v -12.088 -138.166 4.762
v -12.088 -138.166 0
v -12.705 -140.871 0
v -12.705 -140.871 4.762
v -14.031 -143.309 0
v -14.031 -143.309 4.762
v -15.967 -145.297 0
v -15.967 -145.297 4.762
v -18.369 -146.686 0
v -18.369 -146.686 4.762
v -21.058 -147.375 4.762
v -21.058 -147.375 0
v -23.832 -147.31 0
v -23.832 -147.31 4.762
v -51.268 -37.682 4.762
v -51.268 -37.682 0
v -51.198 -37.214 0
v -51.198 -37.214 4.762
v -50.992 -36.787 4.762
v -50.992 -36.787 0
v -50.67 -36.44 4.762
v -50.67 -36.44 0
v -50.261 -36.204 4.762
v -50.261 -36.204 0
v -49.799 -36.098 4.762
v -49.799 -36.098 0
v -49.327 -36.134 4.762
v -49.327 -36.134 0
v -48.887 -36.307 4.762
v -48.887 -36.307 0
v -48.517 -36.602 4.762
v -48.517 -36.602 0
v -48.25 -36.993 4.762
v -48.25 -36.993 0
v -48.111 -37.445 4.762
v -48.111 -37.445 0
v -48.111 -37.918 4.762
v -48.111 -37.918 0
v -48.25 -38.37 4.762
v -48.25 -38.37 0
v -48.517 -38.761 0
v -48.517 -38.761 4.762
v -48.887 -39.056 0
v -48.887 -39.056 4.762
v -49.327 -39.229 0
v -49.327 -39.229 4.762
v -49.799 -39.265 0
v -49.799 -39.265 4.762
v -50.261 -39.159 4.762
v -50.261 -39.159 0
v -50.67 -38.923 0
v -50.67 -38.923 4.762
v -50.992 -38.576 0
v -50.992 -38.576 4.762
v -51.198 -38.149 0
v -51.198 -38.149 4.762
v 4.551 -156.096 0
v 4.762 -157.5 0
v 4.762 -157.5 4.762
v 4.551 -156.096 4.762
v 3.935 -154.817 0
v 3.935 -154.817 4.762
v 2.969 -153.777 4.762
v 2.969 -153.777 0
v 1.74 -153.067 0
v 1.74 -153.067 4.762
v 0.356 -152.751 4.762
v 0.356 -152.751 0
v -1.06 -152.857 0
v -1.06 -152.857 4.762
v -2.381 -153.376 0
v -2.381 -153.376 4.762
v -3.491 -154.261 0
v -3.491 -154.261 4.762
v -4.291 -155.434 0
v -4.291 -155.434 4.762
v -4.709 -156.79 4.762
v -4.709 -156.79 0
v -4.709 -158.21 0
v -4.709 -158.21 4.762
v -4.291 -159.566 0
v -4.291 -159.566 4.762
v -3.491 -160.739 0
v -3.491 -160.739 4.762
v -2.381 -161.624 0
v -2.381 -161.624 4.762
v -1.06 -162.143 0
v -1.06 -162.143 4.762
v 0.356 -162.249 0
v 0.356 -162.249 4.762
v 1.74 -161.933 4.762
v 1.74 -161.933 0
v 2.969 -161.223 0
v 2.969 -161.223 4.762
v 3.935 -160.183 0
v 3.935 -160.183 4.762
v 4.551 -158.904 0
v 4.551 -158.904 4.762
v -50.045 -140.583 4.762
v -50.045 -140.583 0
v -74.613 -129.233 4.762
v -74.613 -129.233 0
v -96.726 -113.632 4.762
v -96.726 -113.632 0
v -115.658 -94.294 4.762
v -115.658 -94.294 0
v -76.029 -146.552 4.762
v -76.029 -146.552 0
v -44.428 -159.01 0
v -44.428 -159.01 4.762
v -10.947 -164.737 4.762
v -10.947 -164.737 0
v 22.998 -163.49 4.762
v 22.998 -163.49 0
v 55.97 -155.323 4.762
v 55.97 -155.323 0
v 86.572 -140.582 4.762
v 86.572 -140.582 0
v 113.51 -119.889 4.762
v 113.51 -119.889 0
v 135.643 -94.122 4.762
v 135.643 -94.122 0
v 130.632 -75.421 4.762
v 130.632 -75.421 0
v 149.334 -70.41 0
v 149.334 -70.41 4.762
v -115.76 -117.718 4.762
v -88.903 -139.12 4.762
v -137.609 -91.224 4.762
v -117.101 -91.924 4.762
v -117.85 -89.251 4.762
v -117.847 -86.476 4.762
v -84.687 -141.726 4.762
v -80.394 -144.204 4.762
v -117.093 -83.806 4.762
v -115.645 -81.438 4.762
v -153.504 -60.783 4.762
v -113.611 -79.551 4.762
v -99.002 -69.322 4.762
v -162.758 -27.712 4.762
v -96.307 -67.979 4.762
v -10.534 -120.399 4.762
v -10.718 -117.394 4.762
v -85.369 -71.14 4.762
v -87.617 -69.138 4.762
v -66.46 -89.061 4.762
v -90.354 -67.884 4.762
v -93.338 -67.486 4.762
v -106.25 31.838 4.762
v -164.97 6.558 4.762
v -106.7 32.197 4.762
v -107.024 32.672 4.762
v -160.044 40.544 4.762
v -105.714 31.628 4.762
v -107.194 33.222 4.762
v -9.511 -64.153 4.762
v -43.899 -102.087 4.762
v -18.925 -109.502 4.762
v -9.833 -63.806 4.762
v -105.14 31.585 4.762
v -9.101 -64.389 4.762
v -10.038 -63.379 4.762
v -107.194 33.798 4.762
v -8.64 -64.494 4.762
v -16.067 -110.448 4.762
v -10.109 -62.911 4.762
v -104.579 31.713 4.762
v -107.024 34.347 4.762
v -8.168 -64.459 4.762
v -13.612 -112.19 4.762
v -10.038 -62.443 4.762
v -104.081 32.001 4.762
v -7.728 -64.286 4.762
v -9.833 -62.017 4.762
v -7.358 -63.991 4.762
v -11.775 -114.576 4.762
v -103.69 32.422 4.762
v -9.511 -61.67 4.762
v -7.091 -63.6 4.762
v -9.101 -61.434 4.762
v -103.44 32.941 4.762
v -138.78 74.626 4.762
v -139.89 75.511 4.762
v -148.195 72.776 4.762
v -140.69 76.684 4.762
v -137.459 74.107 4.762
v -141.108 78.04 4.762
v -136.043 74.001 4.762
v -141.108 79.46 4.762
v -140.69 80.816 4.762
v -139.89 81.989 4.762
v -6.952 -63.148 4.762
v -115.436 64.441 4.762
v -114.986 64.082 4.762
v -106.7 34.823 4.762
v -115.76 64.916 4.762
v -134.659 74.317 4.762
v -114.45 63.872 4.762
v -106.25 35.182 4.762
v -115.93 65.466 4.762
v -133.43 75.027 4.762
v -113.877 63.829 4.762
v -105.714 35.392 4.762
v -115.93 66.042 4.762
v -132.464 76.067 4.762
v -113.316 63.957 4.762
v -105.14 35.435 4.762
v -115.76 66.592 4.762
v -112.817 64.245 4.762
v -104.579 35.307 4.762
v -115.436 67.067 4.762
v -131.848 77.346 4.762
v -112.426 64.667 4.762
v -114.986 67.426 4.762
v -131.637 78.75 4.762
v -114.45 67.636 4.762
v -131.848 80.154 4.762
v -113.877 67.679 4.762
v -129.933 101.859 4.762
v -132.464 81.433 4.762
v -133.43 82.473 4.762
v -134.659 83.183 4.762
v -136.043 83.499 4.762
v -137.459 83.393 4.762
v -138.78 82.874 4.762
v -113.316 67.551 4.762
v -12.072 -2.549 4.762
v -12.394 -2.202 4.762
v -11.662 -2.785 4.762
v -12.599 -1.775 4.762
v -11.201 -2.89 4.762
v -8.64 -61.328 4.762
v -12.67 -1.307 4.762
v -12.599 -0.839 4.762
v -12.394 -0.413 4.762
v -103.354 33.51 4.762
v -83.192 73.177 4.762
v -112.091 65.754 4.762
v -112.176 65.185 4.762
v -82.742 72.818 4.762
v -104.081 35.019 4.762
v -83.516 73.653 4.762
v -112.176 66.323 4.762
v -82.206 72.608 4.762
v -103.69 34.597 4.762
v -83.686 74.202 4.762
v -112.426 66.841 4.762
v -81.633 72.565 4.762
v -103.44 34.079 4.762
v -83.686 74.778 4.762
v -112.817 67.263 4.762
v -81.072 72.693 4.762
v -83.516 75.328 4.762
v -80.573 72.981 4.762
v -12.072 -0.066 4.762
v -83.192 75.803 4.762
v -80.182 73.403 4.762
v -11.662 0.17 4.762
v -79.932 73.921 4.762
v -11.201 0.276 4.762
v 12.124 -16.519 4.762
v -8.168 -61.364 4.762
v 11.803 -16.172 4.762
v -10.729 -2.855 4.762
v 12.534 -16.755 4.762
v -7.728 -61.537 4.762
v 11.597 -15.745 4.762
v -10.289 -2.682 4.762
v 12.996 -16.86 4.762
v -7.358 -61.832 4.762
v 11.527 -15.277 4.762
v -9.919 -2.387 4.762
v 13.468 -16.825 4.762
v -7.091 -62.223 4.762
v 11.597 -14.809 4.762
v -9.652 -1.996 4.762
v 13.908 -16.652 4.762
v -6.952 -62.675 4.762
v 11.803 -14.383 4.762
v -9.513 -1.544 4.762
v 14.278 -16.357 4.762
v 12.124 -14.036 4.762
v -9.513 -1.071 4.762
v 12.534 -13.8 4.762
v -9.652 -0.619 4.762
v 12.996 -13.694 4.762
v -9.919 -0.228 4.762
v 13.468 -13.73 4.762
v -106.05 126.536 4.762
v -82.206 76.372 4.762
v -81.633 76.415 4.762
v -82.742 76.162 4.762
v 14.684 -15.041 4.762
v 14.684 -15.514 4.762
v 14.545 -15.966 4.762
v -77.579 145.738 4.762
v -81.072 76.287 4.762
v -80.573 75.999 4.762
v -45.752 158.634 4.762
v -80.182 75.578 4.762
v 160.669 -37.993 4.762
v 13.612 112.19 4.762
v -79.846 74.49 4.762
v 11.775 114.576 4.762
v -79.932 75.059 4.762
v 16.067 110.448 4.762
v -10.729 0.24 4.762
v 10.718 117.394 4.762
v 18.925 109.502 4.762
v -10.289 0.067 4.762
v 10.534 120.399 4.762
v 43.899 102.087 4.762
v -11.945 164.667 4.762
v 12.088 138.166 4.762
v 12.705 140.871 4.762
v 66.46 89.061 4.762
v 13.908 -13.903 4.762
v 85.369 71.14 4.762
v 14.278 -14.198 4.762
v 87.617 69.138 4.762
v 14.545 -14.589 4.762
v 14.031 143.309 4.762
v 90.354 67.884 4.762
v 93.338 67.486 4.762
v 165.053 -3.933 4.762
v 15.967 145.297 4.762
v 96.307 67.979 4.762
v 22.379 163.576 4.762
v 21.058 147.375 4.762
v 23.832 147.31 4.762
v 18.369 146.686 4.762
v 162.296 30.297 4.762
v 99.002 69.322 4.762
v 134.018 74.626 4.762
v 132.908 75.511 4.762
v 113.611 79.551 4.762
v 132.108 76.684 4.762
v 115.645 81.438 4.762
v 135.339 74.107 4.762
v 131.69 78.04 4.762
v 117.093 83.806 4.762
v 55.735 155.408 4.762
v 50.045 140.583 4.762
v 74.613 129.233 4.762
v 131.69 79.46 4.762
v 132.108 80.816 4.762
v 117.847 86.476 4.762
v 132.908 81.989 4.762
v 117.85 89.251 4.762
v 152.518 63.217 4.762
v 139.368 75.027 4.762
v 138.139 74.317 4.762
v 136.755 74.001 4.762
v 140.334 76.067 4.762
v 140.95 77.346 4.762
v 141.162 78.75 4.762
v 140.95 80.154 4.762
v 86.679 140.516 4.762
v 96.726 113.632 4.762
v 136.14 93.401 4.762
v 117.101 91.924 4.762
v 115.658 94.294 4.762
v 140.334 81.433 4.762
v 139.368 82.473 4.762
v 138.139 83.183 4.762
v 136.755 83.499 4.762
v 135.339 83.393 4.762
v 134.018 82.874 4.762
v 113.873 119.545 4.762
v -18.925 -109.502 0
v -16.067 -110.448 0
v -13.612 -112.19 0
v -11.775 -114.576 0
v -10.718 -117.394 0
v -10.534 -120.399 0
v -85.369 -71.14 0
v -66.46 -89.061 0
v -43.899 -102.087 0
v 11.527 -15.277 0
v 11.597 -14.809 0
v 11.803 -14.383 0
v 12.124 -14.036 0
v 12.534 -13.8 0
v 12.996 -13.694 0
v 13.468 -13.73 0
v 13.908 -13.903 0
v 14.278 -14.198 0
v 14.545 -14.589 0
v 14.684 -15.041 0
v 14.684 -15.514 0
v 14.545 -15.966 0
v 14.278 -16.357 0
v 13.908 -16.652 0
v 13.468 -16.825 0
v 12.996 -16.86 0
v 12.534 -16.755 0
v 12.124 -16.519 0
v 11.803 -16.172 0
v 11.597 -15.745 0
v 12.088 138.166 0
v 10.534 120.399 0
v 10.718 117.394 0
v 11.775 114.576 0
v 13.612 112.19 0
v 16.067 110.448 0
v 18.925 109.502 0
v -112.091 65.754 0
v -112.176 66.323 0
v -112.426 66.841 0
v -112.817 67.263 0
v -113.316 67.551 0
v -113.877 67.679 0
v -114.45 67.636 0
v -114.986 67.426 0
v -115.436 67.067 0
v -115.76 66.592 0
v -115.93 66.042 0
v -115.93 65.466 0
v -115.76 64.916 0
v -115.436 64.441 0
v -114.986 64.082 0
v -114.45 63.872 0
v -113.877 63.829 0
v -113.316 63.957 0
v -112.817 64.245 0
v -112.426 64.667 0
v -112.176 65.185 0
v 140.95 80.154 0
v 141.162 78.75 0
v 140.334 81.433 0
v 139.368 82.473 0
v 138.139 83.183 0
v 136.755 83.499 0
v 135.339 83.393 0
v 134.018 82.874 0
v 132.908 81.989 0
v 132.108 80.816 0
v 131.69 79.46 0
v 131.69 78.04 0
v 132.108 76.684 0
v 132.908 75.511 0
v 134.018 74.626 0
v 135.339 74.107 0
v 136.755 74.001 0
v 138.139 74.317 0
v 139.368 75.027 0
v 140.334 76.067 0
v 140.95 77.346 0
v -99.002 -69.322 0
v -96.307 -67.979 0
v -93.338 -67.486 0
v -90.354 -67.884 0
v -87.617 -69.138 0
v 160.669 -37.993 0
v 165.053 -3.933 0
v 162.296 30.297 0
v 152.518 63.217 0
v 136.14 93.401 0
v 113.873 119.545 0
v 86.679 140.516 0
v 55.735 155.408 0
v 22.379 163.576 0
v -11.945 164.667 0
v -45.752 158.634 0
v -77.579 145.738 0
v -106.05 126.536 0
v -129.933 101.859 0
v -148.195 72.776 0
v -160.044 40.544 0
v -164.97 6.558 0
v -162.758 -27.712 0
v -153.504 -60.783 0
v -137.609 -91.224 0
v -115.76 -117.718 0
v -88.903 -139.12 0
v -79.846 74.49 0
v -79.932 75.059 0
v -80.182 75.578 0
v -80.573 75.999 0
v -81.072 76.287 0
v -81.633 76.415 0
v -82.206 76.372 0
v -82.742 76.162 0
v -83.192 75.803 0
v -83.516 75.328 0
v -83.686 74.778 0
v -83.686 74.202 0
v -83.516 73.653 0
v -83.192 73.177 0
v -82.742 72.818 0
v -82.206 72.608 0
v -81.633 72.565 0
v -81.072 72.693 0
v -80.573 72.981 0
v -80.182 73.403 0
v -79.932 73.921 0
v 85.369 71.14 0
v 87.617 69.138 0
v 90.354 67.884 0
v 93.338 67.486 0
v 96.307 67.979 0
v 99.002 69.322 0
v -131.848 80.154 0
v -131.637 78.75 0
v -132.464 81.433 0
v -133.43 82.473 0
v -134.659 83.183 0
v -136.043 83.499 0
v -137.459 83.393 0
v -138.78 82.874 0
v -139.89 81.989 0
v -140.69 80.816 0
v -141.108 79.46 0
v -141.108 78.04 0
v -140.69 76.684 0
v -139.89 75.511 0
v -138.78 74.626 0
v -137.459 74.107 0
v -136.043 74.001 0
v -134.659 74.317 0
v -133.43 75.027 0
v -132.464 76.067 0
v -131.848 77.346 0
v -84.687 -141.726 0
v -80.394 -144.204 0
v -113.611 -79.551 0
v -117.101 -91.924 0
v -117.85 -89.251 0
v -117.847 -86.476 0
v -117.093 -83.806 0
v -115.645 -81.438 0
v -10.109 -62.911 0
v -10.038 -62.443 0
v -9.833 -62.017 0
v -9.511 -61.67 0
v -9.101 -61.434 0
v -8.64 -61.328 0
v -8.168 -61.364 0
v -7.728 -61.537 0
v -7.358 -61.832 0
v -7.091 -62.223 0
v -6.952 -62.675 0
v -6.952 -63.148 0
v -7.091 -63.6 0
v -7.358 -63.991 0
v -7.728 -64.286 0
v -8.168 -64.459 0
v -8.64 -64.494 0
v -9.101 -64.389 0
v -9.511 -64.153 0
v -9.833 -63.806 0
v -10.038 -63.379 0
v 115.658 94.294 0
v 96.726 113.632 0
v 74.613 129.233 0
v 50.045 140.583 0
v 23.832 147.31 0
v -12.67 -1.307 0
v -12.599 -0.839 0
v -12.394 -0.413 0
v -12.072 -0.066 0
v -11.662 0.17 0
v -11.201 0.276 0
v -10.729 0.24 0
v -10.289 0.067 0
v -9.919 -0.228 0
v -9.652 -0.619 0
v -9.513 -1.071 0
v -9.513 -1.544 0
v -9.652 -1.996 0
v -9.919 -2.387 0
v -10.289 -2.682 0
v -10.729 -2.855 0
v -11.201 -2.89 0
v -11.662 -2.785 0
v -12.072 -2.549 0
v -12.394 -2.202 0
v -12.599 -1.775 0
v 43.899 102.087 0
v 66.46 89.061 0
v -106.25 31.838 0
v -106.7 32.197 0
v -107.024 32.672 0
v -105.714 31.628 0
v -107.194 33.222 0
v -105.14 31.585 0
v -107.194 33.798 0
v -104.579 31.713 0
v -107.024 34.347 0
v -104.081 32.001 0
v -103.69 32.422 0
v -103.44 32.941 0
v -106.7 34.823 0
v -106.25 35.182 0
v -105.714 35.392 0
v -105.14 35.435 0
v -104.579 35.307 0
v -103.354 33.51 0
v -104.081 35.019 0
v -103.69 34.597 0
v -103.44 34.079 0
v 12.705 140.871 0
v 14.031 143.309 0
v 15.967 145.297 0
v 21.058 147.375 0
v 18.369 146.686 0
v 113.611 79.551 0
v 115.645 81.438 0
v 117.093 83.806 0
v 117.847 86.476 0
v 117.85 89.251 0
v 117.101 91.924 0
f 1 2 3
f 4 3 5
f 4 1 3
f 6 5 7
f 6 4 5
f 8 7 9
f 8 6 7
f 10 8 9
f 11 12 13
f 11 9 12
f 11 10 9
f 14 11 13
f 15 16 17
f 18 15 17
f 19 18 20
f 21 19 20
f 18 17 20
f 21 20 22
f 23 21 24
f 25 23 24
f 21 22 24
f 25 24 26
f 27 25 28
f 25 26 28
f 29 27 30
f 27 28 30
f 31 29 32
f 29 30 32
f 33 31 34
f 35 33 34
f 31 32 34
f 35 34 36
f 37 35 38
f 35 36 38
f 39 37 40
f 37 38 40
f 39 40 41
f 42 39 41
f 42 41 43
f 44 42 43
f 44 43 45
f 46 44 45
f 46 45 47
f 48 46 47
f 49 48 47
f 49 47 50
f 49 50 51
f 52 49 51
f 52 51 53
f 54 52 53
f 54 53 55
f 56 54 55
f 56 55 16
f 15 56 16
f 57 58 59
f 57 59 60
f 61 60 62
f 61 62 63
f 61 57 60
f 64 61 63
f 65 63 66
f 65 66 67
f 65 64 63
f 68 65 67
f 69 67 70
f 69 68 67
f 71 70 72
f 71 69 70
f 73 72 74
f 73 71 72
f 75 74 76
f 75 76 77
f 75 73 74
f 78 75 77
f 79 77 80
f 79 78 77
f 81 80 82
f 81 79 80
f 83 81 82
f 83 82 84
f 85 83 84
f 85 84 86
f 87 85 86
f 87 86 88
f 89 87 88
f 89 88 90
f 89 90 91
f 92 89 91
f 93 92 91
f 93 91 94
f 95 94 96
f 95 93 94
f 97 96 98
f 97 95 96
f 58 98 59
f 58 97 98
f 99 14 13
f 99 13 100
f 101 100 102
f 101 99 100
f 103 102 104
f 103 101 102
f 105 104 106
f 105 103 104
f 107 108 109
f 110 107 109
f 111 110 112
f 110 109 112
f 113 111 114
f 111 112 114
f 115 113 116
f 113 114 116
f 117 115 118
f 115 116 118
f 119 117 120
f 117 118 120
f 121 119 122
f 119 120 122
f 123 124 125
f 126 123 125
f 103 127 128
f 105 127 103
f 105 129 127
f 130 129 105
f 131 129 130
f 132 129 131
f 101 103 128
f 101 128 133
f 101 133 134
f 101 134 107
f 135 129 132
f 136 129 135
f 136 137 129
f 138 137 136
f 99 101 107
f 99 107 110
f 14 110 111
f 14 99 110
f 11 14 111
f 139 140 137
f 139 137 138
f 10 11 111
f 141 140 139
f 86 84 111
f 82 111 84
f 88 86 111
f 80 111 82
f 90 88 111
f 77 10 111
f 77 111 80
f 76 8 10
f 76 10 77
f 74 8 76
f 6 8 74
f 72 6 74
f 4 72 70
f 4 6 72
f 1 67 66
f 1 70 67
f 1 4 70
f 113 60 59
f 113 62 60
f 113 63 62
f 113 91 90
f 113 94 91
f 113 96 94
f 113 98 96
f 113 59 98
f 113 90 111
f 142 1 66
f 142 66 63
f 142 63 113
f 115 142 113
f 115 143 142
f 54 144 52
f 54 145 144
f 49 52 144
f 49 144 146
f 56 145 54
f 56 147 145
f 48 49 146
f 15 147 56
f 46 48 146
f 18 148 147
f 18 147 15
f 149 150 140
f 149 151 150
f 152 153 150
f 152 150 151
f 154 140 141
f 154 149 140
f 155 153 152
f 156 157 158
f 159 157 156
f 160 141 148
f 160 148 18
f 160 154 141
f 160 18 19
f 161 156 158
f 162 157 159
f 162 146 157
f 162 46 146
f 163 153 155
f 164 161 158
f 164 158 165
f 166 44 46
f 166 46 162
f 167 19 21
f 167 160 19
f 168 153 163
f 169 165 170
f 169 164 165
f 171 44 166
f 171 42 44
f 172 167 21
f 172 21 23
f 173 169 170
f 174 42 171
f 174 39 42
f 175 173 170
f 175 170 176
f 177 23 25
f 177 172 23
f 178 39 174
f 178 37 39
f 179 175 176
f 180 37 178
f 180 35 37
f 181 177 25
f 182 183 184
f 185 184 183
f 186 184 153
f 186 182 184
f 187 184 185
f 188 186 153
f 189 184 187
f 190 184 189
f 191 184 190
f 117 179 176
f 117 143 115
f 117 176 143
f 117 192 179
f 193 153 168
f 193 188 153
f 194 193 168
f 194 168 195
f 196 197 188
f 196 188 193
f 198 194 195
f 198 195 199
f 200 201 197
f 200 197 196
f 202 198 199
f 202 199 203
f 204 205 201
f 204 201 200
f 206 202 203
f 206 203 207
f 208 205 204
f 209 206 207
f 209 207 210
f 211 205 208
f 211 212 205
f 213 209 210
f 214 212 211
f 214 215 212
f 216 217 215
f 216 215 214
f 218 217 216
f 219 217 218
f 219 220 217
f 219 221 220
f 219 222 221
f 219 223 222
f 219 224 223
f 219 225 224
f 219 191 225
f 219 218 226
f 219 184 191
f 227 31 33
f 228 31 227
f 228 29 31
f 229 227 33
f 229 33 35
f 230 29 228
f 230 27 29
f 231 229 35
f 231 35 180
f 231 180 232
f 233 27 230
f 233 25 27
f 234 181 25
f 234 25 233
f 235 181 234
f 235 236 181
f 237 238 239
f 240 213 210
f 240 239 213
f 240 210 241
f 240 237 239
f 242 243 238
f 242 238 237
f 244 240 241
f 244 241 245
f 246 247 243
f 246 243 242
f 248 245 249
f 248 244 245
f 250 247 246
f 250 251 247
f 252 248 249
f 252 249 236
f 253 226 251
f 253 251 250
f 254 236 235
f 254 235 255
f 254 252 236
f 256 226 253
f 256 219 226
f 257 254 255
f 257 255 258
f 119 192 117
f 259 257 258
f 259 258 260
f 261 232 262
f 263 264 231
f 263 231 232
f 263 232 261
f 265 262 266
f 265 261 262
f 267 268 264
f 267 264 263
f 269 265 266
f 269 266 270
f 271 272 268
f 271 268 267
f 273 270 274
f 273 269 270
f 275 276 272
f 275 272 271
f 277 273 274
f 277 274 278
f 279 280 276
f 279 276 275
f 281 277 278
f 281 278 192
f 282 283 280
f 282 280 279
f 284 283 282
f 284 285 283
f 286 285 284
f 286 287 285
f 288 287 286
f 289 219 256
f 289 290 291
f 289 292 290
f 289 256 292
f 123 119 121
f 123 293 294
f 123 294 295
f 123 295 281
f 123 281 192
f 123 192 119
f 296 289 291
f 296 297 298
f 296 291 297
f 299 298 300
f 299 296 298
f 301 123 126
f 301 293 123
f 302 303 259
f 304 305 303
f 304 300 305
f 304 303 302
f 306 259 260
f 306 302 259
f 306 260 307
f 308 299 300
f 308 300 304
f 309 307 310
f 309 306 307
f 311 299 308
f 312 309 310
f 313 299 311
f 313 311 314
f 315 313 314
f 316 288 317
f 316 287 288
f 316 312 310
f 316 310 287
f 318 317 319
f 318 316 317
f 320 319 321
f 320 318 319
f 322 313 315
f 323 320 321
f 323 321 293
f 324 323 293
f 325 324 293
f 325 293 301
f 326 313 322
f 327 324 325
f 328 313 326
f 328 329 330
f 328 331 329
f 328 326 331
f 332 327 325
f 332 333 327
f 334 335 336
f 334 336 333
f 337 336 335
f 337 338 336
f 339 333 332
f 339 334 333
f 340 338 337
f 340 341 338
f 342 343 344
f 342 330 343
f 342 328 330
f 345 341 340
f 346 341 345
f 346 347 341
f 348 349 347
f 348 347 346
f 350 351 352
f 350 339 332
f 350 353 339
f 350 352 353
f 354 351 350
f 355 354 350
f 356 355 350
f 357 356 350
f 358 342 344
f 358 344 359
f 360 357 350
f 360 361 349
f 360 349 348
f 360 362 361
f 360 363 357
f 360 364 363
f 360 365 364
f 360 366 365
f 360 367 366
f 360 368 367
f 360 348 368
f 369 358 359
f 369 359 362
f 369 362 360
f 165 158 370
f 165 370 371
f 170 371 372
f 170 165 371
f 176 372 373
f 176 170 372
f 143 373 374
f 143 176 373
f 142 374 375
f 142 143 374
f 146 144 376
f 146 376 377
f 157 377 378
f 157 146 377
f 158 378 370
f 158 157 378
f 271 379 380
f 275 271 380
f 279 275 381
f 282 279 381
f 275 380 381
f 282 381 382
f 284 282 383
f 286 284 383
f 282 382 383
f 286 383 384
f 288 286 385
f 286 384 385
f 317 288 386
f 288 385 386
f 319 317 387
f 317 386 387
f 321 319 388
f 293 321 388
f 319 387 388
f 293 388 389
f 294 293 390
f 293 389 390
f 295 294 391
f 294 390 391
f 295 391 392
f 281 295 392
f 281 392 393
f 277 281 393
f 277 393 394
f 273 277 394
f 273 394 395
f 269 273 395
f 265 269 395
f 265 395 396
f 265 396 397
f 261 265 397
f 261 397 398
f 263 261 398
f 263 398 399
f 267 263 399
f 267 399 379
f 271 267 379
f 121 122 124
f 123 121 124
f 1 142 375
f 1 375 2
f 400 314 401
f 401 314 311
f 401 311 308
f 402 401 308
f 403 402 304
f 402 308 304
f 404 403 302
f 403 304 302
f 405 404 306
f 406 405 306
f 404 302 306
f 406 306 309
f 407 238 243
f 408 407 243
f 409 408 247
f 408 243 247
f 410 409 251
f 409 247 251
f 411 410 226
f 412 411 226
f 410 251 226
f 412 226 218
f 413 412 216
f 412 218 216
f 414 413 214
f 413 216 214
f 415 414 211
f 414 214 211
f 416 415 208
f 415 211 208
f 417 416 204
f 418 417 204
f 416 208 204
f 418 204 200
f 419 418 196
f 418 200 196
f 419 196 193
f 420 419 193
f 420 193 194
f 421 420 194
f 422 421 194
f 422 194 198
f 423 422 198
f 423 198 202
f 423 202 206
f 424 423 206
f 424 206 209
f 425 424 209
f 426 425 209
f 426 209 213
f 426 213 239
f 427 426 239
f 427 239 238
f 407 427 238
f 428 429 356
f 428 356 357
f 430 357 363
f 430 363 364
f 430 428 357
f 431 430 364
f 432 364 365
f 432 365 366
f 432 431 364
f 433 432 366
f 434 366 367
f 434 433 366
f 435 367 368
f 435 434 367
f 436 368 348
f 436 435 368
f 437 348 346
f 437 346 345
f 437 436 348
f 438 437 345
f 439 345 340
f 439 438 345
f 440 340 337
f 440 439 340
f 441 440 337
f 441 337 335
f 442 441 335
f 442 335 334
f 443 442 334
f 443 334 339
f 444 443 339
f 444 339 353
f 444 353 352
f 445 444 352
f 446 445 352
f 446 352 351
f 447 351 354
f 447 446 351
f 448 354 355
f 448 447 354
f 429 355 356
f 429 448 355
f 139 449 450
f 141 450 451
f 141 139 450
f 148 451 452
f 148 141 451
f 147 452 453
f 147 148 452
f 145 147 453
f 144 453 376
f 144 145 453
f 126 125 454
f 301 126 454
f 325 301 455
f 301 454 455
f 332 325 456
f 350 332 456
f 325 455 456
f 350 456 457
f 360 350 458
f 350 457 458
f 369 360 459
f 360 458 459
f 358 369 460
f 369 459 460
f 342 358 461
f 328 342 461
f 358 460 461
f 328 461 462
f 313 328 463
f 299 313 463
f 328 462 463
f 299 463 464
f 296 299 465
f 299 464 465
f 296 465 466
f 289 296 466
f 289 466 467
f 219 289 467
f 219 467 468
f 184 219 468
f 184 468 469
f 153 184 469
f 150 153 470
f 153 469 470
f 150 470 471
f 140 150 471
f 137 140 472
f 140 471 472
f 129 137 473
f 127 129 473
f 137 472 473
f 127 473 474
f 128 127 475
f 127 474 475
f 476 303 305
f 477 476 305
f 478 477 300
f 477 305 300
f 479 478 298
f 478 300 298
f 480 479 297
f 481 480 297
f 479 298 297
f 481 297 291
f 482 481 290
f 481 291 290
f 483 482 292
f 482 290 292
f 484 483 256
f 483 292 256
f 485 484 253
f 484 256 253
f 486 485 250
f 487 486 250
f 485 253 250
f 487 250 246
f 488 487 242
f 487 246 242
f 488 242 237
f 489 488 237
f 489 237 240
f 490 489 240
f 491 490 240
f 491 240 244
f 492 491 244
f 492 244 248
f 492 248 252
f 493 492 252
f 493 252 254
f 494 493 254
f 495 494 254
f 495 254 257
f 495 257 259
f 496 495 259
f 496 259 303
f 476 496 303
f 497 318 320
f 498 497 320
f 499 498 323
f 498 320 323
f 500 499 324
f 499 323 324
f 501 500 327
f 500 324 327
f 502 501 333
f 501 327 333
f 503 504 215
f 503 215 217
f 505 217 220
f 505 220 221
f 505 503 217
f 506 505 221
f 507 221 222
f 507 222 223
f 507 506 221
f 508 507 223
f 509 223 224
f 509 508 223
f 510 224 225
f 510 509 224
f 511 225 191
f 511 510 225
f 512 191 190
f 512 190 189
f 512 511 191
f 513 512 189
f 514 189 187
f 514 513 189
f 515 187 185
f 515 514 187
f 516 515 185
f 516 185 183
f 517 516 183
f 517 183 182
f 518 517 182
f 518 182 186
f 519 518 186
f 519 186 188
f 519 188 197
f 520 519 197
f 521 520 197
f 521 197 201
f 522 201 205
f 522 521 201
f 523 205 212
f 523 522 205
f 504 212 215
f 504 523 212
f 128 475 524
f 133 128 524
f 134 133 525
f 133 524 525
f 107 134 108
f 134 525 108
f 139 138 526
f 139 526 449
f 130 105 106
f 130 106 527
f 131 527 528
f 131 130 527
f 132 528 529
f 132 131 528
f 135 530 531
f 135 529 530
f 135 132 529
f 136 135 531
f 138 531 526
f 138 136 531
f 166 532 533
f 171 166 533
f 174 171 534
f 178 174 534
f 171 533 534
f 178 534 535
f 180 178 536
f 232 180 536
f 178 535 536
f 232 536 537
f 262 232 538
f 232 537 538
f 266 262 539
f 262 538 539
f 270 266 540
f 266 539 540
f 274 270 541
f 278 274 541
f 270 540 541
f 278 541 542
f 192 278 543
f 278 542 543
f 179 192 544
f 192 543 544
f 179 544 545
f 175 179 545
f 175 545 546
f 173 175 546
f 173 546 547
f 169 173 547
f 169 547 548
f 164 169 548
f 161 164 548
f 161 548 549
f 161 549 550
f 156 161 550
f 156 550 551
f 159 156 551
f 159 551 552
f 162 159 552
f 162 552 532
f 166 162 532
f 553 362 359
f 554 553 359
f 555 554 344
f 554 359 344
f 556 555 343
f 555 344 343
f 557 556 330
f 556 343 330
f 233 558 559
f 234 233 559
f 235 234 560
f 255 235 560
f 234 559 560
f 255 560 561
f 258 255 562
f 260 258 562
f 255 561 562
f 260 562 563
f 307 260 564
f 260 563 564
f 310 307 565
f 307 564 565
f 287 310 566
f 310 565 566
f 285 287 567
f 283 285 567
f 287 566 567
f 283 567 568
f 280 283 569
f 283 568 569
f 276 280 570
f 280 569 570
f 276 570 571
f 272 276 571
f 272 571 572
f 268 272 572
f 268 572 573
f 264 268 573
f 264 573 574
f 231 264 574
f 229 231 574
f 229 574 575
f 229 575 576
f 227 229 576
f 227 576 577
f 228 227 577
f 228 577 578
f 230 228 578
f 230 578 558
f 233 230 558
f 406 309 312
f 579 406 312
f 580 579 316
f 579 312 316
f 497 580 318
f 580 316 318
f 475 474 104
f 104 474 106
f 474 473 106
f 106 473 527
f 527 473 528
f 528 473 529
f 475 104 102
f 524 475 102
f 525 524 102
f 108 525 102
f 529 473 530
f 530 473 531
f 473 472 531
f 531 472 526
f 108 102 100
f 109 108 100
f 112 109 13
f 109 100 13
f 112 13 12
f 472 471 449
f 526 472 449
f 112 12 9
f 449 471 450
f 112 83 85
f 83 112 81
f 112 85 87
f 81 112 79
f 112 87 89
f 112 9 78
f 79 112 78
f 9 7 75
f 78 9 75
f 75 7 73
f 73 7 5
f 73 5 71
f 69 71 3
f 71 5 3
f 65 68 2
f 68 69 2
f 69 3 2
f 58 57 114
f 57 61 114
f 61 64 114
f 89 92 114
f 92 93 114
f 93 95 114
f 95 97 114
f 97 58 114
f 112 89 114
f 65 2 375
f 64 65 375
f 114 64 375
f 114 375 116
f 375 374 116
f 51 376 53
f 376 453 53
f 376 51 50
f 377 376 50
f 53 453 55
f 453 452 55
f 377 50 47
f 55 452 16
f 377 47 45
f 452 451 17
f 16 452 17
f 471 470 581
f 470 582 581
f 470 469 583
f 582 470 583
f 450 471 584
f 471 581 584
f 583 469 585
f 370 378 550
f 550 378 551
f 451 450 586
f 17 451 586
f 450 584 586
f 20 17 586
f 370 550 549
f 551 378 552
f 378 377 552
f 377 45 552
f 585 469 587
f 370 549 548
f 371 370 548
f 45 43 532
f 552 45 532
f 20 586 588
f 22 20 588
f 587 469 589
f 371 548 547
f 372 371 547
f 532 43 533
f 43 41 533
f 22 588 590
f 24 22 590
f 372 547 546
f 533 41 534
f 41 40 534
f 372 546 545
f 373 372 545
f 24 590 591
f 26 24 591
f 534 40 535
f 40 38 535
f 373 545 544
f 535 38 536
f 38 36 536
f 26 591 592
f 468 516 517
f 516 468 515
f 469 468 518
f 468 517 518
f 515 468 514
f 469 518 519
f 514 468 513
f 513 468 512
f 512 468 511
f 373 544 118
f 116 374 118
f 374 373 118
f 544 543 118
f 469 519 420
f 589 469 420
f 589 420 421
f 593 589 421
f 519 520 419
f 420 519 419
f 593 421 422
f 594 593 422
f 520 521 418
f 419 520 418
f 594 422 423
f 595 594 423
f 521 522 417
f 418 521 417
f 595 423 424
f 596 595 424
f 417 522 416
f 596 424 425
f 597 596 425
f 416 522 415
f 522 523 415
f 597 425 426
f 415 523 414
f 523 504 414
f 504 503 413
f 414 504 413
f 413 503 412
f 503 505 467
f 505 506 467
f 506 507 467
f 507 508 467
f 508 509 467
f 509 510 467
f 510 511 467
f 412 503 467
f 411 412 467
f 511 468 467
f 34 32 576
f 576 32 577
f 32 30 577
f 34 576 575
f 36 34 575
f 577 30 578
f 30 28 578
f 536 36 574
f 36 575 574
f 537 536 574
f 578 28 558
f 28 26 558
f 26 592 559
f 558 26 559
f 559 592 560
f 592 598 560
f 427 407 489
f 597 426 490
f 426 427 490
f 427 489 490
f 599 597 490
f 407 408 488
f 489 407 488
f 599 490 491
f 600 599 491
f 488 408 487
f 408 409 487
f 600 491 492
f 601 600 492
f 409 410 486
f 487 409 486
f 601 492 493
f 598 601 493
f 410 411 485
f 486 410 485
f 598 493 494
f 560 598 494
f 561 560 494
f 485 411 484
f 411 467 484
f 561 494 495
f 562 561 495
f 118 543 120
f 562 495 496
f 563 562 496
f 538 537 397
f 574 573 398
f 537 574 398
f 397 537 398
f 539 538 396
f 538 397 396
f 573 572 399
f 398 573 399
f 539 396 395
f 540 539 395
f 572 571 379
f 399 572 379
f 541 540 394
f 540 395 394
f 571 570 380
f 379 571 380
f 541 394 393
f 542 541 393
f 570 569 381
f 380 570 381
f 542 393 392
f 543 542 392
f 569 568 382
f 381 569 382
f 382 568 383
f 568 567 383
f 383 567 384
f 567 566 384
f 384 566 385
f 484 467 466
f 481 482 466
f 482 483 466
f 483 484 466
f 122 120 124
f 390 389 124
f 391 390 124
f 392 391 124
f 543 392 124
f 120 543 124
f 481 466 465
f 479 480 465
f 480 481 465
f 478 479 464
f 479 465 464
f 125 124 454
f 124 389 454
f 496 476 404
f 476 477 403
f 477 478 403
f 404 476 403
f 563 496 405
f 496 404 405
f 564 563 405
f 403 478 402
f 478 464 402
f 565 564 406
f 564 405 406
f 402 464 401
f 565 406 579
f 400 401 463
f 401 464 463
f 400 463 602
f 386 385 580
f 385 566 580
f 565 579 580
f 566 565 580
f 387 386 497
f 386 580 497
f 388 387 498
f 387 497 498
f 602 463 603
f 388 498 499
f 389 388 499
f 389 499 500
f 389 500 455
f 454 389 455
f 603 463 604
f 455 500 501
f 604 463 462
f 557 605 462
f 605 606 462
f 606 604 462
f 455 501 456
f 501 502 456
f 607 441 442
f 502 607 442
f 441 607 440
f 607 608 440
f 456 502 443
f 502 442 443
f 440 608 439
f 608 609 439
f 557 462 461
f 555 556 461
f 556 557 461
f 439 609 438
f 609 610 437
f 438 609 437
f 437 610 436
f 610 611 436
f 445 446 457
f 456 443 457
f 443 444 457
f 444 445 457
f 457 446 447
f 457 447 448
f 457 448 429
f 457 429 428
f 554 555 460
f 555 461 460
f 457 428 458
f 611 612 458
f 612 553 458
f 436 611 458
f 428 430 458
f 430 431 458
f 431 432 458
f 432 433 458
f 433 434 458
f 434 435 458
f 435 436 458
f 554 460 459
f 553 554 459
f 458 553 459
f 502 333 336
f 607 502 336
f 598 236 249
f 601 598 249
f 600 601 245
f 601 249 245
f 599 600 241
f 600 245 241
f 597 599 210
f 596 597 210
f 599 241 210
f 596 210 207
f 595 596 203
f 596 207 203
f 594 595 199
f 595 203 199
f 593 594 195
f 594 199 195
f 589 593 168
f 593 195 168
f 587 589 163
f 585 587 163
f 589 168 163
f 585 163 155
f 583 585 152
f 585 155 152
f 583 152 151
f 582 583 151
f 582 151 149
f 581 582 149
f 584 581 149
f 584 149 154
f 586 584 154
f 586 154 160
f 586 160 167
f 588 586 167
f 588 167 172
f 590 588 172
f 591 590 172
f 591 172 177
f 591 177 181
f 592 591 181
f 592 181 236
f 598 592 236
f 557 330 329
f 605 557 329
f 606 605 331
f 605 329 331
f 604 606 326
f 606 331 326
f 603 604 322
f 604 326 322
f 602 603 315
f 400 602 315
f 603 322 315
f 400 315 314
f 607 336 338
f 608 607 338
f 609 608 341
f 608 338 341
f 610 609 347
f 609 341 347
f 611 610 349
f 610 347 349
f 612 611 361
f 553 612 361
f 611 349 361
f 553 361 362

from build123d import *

# Parameters (mm, degrees)
SKETCH1_R                    = 4.7625
BOSS_EXTRUDE1_DEPTH          = 4.762
SKETCH5_R                    = 1.9304
MOTOR_MOUNTING_HOLES_DEPTH   = 5.762
SKETCH7_R                    = 1.5875
ARDUINO_MOUNTING_HOLES_DEPTH = 5.762
HANDLES_DEPTH                = 5.762


with BuildPart() as part:
    # Sketch1 → Boss-Extrude1 (new body)
    with BuildSketch(Plane.XY):
        with BuildLine():
            Line((135.64320405, -94.121895407), (130.632187999, -75.420528906))
            Line((130.632187999, -75.420528906), (149.3335545, -70.409512855))
            ThreePointArc((149.3335545, -70.409512855), (-45.751779591, 158.634122005), (-88.90313596, -139.119525648))
            ThreePointArc((-88.90313596, -139.119525648), (-82.55, -142.980794165), (-76.029475394, -146.552137041))
            ThreePointArc((-76.029475394, -146.552137041), (39.694857608, -160.257069359), (135.64320405, -94.121895407))
        make_face()
        with Locations((0, -157.49999996)):
            Circle(SKETCH1_R, mode=Mode.SUBTRACT)
        with Locations((-136.399001061, 78.74999998)):
            Circle(SKETCH1_R, mode=Mode.SUBTRACT)
        with Locations((136.399001061, 78.74999998)):
            Circle(SKETCH1_R, mode=Mode.SUBTRACT)
    extrude(amount=BOSS_EXTRUDE1_DEPTH)

    # Sketch5 → motor_mounting_holes (cut, through all)
    with BuildSketch(Plane.XY.offset(4.762)):
        with Locations((-114.020939706, 65.753939357)):
            Circle(SKETCH5_R)
        with Locations((-81.776804288, 74.490196087)):
            Circle(SKETCH5_R)
        with Locations((-105.284682976, 33.50980394)):
            Circle(SKETCH5_R)
    extrude(amount=-MOTOR_MOUNTING_HOLES_DEPTH, mode=Mode.SUBTRACT)

    # Sketch7 → arduino mounting holes (cut, through all)
    with BuildSketch(Plane(origin=(0, 0, 0), x_dir=(-1, 0, 0), z_dir=(0, 0, -1))):
        with Locations((-13.114276913, -15.277418882)):
            Circle(SKETCH7_R)
        with Locations((8.521314036, -62.911361657)):
            Circle(SKETCH7_R)
        with Locations((11.082472869, -1.307418882)):
            Circle(SKETCH7_R)
        with Locations((49.680700023, -37.681509395)):
            Circle(SKETCH7_R)
    extrude(amount=-ARDUINO_MOUNTING_HOLES_DEPTH, mode=Mode.SUBTRACT)

    # Sketch8 → handles (cut, through all)
    with BuildSketch(Plane.XY.offset(4.762)):
        with BuildLine():
            Line((12.087922967, 138.165591749), (10.53352986, 120.398797227))
            ThreePointArc((10.53352986, 120.398797227), (12.604919715, 113.314590764), (18.92461727, 109.501709969))
            ThreePointArc((18.92461727, 109.501709969), (55.5625, 96.237072996), (85.368953956, 71.140054298))
            ThreePointArc((85.368953956, 71.140054298), (91.830854363, 67.573476067), (99.001652054, 69.321703063))
            Line((99.001652054, 69.321703063), (113.6109509, 79.551244243))
            ThreePointArc((113.6109509, 79.551244243), (117.84686521, 86.476490147), (115.658001653, 94.293834786))
            ThreePointArc((115.658001653, 94.293834786), (74.6125, 129.23264088), (23.831855518, 147.309684975))
            ThreePointArc((23.831855518, 147.309684975), (15.967404692, 145.296624102), (12.087922967, 138.165591749))
        make_face()
        with BuildLine():
            Line((-113.6109509, -79.551244243), (-99.001652054, -69.321703063))
            ThreePointArc((-99.001652054, -69.321703063), (-91.830854363, -67.573476067), (-85.368953956, -71.140054298))
            ThreePointArc((-85.368953956, -71.140054298), (-55.5625, -96.237072996), (-18.92461727, -109.501709969))
            ThreePointArc((-18.92461727, -109.501709969), (-12.604919715, -113.314590764), (-10.53352986, -120.398797227))
            Line((-10.53352986, -120.398797227), (-12.087922967, -138.165591749))
            ThreePointArc((-12.087922967, -138.165591749), (-15.967404692, -145.296624102), (-23.831855518, -147.309684975))
            ThreePointArc((-23.831855518, -147.309684975), (-74.6125, -129.23264088), (-115.658001653, -94.293834786))
            ThreePointArc((-115.658001653, -94.293834786), (-117.84686521, -86.476490147), (-113.6109509, -79.551244243))
        make_face()
    extrude(amount=-HANDLES_DEPTH, mode=Mode.SUBTRACT)


solid = part.part
